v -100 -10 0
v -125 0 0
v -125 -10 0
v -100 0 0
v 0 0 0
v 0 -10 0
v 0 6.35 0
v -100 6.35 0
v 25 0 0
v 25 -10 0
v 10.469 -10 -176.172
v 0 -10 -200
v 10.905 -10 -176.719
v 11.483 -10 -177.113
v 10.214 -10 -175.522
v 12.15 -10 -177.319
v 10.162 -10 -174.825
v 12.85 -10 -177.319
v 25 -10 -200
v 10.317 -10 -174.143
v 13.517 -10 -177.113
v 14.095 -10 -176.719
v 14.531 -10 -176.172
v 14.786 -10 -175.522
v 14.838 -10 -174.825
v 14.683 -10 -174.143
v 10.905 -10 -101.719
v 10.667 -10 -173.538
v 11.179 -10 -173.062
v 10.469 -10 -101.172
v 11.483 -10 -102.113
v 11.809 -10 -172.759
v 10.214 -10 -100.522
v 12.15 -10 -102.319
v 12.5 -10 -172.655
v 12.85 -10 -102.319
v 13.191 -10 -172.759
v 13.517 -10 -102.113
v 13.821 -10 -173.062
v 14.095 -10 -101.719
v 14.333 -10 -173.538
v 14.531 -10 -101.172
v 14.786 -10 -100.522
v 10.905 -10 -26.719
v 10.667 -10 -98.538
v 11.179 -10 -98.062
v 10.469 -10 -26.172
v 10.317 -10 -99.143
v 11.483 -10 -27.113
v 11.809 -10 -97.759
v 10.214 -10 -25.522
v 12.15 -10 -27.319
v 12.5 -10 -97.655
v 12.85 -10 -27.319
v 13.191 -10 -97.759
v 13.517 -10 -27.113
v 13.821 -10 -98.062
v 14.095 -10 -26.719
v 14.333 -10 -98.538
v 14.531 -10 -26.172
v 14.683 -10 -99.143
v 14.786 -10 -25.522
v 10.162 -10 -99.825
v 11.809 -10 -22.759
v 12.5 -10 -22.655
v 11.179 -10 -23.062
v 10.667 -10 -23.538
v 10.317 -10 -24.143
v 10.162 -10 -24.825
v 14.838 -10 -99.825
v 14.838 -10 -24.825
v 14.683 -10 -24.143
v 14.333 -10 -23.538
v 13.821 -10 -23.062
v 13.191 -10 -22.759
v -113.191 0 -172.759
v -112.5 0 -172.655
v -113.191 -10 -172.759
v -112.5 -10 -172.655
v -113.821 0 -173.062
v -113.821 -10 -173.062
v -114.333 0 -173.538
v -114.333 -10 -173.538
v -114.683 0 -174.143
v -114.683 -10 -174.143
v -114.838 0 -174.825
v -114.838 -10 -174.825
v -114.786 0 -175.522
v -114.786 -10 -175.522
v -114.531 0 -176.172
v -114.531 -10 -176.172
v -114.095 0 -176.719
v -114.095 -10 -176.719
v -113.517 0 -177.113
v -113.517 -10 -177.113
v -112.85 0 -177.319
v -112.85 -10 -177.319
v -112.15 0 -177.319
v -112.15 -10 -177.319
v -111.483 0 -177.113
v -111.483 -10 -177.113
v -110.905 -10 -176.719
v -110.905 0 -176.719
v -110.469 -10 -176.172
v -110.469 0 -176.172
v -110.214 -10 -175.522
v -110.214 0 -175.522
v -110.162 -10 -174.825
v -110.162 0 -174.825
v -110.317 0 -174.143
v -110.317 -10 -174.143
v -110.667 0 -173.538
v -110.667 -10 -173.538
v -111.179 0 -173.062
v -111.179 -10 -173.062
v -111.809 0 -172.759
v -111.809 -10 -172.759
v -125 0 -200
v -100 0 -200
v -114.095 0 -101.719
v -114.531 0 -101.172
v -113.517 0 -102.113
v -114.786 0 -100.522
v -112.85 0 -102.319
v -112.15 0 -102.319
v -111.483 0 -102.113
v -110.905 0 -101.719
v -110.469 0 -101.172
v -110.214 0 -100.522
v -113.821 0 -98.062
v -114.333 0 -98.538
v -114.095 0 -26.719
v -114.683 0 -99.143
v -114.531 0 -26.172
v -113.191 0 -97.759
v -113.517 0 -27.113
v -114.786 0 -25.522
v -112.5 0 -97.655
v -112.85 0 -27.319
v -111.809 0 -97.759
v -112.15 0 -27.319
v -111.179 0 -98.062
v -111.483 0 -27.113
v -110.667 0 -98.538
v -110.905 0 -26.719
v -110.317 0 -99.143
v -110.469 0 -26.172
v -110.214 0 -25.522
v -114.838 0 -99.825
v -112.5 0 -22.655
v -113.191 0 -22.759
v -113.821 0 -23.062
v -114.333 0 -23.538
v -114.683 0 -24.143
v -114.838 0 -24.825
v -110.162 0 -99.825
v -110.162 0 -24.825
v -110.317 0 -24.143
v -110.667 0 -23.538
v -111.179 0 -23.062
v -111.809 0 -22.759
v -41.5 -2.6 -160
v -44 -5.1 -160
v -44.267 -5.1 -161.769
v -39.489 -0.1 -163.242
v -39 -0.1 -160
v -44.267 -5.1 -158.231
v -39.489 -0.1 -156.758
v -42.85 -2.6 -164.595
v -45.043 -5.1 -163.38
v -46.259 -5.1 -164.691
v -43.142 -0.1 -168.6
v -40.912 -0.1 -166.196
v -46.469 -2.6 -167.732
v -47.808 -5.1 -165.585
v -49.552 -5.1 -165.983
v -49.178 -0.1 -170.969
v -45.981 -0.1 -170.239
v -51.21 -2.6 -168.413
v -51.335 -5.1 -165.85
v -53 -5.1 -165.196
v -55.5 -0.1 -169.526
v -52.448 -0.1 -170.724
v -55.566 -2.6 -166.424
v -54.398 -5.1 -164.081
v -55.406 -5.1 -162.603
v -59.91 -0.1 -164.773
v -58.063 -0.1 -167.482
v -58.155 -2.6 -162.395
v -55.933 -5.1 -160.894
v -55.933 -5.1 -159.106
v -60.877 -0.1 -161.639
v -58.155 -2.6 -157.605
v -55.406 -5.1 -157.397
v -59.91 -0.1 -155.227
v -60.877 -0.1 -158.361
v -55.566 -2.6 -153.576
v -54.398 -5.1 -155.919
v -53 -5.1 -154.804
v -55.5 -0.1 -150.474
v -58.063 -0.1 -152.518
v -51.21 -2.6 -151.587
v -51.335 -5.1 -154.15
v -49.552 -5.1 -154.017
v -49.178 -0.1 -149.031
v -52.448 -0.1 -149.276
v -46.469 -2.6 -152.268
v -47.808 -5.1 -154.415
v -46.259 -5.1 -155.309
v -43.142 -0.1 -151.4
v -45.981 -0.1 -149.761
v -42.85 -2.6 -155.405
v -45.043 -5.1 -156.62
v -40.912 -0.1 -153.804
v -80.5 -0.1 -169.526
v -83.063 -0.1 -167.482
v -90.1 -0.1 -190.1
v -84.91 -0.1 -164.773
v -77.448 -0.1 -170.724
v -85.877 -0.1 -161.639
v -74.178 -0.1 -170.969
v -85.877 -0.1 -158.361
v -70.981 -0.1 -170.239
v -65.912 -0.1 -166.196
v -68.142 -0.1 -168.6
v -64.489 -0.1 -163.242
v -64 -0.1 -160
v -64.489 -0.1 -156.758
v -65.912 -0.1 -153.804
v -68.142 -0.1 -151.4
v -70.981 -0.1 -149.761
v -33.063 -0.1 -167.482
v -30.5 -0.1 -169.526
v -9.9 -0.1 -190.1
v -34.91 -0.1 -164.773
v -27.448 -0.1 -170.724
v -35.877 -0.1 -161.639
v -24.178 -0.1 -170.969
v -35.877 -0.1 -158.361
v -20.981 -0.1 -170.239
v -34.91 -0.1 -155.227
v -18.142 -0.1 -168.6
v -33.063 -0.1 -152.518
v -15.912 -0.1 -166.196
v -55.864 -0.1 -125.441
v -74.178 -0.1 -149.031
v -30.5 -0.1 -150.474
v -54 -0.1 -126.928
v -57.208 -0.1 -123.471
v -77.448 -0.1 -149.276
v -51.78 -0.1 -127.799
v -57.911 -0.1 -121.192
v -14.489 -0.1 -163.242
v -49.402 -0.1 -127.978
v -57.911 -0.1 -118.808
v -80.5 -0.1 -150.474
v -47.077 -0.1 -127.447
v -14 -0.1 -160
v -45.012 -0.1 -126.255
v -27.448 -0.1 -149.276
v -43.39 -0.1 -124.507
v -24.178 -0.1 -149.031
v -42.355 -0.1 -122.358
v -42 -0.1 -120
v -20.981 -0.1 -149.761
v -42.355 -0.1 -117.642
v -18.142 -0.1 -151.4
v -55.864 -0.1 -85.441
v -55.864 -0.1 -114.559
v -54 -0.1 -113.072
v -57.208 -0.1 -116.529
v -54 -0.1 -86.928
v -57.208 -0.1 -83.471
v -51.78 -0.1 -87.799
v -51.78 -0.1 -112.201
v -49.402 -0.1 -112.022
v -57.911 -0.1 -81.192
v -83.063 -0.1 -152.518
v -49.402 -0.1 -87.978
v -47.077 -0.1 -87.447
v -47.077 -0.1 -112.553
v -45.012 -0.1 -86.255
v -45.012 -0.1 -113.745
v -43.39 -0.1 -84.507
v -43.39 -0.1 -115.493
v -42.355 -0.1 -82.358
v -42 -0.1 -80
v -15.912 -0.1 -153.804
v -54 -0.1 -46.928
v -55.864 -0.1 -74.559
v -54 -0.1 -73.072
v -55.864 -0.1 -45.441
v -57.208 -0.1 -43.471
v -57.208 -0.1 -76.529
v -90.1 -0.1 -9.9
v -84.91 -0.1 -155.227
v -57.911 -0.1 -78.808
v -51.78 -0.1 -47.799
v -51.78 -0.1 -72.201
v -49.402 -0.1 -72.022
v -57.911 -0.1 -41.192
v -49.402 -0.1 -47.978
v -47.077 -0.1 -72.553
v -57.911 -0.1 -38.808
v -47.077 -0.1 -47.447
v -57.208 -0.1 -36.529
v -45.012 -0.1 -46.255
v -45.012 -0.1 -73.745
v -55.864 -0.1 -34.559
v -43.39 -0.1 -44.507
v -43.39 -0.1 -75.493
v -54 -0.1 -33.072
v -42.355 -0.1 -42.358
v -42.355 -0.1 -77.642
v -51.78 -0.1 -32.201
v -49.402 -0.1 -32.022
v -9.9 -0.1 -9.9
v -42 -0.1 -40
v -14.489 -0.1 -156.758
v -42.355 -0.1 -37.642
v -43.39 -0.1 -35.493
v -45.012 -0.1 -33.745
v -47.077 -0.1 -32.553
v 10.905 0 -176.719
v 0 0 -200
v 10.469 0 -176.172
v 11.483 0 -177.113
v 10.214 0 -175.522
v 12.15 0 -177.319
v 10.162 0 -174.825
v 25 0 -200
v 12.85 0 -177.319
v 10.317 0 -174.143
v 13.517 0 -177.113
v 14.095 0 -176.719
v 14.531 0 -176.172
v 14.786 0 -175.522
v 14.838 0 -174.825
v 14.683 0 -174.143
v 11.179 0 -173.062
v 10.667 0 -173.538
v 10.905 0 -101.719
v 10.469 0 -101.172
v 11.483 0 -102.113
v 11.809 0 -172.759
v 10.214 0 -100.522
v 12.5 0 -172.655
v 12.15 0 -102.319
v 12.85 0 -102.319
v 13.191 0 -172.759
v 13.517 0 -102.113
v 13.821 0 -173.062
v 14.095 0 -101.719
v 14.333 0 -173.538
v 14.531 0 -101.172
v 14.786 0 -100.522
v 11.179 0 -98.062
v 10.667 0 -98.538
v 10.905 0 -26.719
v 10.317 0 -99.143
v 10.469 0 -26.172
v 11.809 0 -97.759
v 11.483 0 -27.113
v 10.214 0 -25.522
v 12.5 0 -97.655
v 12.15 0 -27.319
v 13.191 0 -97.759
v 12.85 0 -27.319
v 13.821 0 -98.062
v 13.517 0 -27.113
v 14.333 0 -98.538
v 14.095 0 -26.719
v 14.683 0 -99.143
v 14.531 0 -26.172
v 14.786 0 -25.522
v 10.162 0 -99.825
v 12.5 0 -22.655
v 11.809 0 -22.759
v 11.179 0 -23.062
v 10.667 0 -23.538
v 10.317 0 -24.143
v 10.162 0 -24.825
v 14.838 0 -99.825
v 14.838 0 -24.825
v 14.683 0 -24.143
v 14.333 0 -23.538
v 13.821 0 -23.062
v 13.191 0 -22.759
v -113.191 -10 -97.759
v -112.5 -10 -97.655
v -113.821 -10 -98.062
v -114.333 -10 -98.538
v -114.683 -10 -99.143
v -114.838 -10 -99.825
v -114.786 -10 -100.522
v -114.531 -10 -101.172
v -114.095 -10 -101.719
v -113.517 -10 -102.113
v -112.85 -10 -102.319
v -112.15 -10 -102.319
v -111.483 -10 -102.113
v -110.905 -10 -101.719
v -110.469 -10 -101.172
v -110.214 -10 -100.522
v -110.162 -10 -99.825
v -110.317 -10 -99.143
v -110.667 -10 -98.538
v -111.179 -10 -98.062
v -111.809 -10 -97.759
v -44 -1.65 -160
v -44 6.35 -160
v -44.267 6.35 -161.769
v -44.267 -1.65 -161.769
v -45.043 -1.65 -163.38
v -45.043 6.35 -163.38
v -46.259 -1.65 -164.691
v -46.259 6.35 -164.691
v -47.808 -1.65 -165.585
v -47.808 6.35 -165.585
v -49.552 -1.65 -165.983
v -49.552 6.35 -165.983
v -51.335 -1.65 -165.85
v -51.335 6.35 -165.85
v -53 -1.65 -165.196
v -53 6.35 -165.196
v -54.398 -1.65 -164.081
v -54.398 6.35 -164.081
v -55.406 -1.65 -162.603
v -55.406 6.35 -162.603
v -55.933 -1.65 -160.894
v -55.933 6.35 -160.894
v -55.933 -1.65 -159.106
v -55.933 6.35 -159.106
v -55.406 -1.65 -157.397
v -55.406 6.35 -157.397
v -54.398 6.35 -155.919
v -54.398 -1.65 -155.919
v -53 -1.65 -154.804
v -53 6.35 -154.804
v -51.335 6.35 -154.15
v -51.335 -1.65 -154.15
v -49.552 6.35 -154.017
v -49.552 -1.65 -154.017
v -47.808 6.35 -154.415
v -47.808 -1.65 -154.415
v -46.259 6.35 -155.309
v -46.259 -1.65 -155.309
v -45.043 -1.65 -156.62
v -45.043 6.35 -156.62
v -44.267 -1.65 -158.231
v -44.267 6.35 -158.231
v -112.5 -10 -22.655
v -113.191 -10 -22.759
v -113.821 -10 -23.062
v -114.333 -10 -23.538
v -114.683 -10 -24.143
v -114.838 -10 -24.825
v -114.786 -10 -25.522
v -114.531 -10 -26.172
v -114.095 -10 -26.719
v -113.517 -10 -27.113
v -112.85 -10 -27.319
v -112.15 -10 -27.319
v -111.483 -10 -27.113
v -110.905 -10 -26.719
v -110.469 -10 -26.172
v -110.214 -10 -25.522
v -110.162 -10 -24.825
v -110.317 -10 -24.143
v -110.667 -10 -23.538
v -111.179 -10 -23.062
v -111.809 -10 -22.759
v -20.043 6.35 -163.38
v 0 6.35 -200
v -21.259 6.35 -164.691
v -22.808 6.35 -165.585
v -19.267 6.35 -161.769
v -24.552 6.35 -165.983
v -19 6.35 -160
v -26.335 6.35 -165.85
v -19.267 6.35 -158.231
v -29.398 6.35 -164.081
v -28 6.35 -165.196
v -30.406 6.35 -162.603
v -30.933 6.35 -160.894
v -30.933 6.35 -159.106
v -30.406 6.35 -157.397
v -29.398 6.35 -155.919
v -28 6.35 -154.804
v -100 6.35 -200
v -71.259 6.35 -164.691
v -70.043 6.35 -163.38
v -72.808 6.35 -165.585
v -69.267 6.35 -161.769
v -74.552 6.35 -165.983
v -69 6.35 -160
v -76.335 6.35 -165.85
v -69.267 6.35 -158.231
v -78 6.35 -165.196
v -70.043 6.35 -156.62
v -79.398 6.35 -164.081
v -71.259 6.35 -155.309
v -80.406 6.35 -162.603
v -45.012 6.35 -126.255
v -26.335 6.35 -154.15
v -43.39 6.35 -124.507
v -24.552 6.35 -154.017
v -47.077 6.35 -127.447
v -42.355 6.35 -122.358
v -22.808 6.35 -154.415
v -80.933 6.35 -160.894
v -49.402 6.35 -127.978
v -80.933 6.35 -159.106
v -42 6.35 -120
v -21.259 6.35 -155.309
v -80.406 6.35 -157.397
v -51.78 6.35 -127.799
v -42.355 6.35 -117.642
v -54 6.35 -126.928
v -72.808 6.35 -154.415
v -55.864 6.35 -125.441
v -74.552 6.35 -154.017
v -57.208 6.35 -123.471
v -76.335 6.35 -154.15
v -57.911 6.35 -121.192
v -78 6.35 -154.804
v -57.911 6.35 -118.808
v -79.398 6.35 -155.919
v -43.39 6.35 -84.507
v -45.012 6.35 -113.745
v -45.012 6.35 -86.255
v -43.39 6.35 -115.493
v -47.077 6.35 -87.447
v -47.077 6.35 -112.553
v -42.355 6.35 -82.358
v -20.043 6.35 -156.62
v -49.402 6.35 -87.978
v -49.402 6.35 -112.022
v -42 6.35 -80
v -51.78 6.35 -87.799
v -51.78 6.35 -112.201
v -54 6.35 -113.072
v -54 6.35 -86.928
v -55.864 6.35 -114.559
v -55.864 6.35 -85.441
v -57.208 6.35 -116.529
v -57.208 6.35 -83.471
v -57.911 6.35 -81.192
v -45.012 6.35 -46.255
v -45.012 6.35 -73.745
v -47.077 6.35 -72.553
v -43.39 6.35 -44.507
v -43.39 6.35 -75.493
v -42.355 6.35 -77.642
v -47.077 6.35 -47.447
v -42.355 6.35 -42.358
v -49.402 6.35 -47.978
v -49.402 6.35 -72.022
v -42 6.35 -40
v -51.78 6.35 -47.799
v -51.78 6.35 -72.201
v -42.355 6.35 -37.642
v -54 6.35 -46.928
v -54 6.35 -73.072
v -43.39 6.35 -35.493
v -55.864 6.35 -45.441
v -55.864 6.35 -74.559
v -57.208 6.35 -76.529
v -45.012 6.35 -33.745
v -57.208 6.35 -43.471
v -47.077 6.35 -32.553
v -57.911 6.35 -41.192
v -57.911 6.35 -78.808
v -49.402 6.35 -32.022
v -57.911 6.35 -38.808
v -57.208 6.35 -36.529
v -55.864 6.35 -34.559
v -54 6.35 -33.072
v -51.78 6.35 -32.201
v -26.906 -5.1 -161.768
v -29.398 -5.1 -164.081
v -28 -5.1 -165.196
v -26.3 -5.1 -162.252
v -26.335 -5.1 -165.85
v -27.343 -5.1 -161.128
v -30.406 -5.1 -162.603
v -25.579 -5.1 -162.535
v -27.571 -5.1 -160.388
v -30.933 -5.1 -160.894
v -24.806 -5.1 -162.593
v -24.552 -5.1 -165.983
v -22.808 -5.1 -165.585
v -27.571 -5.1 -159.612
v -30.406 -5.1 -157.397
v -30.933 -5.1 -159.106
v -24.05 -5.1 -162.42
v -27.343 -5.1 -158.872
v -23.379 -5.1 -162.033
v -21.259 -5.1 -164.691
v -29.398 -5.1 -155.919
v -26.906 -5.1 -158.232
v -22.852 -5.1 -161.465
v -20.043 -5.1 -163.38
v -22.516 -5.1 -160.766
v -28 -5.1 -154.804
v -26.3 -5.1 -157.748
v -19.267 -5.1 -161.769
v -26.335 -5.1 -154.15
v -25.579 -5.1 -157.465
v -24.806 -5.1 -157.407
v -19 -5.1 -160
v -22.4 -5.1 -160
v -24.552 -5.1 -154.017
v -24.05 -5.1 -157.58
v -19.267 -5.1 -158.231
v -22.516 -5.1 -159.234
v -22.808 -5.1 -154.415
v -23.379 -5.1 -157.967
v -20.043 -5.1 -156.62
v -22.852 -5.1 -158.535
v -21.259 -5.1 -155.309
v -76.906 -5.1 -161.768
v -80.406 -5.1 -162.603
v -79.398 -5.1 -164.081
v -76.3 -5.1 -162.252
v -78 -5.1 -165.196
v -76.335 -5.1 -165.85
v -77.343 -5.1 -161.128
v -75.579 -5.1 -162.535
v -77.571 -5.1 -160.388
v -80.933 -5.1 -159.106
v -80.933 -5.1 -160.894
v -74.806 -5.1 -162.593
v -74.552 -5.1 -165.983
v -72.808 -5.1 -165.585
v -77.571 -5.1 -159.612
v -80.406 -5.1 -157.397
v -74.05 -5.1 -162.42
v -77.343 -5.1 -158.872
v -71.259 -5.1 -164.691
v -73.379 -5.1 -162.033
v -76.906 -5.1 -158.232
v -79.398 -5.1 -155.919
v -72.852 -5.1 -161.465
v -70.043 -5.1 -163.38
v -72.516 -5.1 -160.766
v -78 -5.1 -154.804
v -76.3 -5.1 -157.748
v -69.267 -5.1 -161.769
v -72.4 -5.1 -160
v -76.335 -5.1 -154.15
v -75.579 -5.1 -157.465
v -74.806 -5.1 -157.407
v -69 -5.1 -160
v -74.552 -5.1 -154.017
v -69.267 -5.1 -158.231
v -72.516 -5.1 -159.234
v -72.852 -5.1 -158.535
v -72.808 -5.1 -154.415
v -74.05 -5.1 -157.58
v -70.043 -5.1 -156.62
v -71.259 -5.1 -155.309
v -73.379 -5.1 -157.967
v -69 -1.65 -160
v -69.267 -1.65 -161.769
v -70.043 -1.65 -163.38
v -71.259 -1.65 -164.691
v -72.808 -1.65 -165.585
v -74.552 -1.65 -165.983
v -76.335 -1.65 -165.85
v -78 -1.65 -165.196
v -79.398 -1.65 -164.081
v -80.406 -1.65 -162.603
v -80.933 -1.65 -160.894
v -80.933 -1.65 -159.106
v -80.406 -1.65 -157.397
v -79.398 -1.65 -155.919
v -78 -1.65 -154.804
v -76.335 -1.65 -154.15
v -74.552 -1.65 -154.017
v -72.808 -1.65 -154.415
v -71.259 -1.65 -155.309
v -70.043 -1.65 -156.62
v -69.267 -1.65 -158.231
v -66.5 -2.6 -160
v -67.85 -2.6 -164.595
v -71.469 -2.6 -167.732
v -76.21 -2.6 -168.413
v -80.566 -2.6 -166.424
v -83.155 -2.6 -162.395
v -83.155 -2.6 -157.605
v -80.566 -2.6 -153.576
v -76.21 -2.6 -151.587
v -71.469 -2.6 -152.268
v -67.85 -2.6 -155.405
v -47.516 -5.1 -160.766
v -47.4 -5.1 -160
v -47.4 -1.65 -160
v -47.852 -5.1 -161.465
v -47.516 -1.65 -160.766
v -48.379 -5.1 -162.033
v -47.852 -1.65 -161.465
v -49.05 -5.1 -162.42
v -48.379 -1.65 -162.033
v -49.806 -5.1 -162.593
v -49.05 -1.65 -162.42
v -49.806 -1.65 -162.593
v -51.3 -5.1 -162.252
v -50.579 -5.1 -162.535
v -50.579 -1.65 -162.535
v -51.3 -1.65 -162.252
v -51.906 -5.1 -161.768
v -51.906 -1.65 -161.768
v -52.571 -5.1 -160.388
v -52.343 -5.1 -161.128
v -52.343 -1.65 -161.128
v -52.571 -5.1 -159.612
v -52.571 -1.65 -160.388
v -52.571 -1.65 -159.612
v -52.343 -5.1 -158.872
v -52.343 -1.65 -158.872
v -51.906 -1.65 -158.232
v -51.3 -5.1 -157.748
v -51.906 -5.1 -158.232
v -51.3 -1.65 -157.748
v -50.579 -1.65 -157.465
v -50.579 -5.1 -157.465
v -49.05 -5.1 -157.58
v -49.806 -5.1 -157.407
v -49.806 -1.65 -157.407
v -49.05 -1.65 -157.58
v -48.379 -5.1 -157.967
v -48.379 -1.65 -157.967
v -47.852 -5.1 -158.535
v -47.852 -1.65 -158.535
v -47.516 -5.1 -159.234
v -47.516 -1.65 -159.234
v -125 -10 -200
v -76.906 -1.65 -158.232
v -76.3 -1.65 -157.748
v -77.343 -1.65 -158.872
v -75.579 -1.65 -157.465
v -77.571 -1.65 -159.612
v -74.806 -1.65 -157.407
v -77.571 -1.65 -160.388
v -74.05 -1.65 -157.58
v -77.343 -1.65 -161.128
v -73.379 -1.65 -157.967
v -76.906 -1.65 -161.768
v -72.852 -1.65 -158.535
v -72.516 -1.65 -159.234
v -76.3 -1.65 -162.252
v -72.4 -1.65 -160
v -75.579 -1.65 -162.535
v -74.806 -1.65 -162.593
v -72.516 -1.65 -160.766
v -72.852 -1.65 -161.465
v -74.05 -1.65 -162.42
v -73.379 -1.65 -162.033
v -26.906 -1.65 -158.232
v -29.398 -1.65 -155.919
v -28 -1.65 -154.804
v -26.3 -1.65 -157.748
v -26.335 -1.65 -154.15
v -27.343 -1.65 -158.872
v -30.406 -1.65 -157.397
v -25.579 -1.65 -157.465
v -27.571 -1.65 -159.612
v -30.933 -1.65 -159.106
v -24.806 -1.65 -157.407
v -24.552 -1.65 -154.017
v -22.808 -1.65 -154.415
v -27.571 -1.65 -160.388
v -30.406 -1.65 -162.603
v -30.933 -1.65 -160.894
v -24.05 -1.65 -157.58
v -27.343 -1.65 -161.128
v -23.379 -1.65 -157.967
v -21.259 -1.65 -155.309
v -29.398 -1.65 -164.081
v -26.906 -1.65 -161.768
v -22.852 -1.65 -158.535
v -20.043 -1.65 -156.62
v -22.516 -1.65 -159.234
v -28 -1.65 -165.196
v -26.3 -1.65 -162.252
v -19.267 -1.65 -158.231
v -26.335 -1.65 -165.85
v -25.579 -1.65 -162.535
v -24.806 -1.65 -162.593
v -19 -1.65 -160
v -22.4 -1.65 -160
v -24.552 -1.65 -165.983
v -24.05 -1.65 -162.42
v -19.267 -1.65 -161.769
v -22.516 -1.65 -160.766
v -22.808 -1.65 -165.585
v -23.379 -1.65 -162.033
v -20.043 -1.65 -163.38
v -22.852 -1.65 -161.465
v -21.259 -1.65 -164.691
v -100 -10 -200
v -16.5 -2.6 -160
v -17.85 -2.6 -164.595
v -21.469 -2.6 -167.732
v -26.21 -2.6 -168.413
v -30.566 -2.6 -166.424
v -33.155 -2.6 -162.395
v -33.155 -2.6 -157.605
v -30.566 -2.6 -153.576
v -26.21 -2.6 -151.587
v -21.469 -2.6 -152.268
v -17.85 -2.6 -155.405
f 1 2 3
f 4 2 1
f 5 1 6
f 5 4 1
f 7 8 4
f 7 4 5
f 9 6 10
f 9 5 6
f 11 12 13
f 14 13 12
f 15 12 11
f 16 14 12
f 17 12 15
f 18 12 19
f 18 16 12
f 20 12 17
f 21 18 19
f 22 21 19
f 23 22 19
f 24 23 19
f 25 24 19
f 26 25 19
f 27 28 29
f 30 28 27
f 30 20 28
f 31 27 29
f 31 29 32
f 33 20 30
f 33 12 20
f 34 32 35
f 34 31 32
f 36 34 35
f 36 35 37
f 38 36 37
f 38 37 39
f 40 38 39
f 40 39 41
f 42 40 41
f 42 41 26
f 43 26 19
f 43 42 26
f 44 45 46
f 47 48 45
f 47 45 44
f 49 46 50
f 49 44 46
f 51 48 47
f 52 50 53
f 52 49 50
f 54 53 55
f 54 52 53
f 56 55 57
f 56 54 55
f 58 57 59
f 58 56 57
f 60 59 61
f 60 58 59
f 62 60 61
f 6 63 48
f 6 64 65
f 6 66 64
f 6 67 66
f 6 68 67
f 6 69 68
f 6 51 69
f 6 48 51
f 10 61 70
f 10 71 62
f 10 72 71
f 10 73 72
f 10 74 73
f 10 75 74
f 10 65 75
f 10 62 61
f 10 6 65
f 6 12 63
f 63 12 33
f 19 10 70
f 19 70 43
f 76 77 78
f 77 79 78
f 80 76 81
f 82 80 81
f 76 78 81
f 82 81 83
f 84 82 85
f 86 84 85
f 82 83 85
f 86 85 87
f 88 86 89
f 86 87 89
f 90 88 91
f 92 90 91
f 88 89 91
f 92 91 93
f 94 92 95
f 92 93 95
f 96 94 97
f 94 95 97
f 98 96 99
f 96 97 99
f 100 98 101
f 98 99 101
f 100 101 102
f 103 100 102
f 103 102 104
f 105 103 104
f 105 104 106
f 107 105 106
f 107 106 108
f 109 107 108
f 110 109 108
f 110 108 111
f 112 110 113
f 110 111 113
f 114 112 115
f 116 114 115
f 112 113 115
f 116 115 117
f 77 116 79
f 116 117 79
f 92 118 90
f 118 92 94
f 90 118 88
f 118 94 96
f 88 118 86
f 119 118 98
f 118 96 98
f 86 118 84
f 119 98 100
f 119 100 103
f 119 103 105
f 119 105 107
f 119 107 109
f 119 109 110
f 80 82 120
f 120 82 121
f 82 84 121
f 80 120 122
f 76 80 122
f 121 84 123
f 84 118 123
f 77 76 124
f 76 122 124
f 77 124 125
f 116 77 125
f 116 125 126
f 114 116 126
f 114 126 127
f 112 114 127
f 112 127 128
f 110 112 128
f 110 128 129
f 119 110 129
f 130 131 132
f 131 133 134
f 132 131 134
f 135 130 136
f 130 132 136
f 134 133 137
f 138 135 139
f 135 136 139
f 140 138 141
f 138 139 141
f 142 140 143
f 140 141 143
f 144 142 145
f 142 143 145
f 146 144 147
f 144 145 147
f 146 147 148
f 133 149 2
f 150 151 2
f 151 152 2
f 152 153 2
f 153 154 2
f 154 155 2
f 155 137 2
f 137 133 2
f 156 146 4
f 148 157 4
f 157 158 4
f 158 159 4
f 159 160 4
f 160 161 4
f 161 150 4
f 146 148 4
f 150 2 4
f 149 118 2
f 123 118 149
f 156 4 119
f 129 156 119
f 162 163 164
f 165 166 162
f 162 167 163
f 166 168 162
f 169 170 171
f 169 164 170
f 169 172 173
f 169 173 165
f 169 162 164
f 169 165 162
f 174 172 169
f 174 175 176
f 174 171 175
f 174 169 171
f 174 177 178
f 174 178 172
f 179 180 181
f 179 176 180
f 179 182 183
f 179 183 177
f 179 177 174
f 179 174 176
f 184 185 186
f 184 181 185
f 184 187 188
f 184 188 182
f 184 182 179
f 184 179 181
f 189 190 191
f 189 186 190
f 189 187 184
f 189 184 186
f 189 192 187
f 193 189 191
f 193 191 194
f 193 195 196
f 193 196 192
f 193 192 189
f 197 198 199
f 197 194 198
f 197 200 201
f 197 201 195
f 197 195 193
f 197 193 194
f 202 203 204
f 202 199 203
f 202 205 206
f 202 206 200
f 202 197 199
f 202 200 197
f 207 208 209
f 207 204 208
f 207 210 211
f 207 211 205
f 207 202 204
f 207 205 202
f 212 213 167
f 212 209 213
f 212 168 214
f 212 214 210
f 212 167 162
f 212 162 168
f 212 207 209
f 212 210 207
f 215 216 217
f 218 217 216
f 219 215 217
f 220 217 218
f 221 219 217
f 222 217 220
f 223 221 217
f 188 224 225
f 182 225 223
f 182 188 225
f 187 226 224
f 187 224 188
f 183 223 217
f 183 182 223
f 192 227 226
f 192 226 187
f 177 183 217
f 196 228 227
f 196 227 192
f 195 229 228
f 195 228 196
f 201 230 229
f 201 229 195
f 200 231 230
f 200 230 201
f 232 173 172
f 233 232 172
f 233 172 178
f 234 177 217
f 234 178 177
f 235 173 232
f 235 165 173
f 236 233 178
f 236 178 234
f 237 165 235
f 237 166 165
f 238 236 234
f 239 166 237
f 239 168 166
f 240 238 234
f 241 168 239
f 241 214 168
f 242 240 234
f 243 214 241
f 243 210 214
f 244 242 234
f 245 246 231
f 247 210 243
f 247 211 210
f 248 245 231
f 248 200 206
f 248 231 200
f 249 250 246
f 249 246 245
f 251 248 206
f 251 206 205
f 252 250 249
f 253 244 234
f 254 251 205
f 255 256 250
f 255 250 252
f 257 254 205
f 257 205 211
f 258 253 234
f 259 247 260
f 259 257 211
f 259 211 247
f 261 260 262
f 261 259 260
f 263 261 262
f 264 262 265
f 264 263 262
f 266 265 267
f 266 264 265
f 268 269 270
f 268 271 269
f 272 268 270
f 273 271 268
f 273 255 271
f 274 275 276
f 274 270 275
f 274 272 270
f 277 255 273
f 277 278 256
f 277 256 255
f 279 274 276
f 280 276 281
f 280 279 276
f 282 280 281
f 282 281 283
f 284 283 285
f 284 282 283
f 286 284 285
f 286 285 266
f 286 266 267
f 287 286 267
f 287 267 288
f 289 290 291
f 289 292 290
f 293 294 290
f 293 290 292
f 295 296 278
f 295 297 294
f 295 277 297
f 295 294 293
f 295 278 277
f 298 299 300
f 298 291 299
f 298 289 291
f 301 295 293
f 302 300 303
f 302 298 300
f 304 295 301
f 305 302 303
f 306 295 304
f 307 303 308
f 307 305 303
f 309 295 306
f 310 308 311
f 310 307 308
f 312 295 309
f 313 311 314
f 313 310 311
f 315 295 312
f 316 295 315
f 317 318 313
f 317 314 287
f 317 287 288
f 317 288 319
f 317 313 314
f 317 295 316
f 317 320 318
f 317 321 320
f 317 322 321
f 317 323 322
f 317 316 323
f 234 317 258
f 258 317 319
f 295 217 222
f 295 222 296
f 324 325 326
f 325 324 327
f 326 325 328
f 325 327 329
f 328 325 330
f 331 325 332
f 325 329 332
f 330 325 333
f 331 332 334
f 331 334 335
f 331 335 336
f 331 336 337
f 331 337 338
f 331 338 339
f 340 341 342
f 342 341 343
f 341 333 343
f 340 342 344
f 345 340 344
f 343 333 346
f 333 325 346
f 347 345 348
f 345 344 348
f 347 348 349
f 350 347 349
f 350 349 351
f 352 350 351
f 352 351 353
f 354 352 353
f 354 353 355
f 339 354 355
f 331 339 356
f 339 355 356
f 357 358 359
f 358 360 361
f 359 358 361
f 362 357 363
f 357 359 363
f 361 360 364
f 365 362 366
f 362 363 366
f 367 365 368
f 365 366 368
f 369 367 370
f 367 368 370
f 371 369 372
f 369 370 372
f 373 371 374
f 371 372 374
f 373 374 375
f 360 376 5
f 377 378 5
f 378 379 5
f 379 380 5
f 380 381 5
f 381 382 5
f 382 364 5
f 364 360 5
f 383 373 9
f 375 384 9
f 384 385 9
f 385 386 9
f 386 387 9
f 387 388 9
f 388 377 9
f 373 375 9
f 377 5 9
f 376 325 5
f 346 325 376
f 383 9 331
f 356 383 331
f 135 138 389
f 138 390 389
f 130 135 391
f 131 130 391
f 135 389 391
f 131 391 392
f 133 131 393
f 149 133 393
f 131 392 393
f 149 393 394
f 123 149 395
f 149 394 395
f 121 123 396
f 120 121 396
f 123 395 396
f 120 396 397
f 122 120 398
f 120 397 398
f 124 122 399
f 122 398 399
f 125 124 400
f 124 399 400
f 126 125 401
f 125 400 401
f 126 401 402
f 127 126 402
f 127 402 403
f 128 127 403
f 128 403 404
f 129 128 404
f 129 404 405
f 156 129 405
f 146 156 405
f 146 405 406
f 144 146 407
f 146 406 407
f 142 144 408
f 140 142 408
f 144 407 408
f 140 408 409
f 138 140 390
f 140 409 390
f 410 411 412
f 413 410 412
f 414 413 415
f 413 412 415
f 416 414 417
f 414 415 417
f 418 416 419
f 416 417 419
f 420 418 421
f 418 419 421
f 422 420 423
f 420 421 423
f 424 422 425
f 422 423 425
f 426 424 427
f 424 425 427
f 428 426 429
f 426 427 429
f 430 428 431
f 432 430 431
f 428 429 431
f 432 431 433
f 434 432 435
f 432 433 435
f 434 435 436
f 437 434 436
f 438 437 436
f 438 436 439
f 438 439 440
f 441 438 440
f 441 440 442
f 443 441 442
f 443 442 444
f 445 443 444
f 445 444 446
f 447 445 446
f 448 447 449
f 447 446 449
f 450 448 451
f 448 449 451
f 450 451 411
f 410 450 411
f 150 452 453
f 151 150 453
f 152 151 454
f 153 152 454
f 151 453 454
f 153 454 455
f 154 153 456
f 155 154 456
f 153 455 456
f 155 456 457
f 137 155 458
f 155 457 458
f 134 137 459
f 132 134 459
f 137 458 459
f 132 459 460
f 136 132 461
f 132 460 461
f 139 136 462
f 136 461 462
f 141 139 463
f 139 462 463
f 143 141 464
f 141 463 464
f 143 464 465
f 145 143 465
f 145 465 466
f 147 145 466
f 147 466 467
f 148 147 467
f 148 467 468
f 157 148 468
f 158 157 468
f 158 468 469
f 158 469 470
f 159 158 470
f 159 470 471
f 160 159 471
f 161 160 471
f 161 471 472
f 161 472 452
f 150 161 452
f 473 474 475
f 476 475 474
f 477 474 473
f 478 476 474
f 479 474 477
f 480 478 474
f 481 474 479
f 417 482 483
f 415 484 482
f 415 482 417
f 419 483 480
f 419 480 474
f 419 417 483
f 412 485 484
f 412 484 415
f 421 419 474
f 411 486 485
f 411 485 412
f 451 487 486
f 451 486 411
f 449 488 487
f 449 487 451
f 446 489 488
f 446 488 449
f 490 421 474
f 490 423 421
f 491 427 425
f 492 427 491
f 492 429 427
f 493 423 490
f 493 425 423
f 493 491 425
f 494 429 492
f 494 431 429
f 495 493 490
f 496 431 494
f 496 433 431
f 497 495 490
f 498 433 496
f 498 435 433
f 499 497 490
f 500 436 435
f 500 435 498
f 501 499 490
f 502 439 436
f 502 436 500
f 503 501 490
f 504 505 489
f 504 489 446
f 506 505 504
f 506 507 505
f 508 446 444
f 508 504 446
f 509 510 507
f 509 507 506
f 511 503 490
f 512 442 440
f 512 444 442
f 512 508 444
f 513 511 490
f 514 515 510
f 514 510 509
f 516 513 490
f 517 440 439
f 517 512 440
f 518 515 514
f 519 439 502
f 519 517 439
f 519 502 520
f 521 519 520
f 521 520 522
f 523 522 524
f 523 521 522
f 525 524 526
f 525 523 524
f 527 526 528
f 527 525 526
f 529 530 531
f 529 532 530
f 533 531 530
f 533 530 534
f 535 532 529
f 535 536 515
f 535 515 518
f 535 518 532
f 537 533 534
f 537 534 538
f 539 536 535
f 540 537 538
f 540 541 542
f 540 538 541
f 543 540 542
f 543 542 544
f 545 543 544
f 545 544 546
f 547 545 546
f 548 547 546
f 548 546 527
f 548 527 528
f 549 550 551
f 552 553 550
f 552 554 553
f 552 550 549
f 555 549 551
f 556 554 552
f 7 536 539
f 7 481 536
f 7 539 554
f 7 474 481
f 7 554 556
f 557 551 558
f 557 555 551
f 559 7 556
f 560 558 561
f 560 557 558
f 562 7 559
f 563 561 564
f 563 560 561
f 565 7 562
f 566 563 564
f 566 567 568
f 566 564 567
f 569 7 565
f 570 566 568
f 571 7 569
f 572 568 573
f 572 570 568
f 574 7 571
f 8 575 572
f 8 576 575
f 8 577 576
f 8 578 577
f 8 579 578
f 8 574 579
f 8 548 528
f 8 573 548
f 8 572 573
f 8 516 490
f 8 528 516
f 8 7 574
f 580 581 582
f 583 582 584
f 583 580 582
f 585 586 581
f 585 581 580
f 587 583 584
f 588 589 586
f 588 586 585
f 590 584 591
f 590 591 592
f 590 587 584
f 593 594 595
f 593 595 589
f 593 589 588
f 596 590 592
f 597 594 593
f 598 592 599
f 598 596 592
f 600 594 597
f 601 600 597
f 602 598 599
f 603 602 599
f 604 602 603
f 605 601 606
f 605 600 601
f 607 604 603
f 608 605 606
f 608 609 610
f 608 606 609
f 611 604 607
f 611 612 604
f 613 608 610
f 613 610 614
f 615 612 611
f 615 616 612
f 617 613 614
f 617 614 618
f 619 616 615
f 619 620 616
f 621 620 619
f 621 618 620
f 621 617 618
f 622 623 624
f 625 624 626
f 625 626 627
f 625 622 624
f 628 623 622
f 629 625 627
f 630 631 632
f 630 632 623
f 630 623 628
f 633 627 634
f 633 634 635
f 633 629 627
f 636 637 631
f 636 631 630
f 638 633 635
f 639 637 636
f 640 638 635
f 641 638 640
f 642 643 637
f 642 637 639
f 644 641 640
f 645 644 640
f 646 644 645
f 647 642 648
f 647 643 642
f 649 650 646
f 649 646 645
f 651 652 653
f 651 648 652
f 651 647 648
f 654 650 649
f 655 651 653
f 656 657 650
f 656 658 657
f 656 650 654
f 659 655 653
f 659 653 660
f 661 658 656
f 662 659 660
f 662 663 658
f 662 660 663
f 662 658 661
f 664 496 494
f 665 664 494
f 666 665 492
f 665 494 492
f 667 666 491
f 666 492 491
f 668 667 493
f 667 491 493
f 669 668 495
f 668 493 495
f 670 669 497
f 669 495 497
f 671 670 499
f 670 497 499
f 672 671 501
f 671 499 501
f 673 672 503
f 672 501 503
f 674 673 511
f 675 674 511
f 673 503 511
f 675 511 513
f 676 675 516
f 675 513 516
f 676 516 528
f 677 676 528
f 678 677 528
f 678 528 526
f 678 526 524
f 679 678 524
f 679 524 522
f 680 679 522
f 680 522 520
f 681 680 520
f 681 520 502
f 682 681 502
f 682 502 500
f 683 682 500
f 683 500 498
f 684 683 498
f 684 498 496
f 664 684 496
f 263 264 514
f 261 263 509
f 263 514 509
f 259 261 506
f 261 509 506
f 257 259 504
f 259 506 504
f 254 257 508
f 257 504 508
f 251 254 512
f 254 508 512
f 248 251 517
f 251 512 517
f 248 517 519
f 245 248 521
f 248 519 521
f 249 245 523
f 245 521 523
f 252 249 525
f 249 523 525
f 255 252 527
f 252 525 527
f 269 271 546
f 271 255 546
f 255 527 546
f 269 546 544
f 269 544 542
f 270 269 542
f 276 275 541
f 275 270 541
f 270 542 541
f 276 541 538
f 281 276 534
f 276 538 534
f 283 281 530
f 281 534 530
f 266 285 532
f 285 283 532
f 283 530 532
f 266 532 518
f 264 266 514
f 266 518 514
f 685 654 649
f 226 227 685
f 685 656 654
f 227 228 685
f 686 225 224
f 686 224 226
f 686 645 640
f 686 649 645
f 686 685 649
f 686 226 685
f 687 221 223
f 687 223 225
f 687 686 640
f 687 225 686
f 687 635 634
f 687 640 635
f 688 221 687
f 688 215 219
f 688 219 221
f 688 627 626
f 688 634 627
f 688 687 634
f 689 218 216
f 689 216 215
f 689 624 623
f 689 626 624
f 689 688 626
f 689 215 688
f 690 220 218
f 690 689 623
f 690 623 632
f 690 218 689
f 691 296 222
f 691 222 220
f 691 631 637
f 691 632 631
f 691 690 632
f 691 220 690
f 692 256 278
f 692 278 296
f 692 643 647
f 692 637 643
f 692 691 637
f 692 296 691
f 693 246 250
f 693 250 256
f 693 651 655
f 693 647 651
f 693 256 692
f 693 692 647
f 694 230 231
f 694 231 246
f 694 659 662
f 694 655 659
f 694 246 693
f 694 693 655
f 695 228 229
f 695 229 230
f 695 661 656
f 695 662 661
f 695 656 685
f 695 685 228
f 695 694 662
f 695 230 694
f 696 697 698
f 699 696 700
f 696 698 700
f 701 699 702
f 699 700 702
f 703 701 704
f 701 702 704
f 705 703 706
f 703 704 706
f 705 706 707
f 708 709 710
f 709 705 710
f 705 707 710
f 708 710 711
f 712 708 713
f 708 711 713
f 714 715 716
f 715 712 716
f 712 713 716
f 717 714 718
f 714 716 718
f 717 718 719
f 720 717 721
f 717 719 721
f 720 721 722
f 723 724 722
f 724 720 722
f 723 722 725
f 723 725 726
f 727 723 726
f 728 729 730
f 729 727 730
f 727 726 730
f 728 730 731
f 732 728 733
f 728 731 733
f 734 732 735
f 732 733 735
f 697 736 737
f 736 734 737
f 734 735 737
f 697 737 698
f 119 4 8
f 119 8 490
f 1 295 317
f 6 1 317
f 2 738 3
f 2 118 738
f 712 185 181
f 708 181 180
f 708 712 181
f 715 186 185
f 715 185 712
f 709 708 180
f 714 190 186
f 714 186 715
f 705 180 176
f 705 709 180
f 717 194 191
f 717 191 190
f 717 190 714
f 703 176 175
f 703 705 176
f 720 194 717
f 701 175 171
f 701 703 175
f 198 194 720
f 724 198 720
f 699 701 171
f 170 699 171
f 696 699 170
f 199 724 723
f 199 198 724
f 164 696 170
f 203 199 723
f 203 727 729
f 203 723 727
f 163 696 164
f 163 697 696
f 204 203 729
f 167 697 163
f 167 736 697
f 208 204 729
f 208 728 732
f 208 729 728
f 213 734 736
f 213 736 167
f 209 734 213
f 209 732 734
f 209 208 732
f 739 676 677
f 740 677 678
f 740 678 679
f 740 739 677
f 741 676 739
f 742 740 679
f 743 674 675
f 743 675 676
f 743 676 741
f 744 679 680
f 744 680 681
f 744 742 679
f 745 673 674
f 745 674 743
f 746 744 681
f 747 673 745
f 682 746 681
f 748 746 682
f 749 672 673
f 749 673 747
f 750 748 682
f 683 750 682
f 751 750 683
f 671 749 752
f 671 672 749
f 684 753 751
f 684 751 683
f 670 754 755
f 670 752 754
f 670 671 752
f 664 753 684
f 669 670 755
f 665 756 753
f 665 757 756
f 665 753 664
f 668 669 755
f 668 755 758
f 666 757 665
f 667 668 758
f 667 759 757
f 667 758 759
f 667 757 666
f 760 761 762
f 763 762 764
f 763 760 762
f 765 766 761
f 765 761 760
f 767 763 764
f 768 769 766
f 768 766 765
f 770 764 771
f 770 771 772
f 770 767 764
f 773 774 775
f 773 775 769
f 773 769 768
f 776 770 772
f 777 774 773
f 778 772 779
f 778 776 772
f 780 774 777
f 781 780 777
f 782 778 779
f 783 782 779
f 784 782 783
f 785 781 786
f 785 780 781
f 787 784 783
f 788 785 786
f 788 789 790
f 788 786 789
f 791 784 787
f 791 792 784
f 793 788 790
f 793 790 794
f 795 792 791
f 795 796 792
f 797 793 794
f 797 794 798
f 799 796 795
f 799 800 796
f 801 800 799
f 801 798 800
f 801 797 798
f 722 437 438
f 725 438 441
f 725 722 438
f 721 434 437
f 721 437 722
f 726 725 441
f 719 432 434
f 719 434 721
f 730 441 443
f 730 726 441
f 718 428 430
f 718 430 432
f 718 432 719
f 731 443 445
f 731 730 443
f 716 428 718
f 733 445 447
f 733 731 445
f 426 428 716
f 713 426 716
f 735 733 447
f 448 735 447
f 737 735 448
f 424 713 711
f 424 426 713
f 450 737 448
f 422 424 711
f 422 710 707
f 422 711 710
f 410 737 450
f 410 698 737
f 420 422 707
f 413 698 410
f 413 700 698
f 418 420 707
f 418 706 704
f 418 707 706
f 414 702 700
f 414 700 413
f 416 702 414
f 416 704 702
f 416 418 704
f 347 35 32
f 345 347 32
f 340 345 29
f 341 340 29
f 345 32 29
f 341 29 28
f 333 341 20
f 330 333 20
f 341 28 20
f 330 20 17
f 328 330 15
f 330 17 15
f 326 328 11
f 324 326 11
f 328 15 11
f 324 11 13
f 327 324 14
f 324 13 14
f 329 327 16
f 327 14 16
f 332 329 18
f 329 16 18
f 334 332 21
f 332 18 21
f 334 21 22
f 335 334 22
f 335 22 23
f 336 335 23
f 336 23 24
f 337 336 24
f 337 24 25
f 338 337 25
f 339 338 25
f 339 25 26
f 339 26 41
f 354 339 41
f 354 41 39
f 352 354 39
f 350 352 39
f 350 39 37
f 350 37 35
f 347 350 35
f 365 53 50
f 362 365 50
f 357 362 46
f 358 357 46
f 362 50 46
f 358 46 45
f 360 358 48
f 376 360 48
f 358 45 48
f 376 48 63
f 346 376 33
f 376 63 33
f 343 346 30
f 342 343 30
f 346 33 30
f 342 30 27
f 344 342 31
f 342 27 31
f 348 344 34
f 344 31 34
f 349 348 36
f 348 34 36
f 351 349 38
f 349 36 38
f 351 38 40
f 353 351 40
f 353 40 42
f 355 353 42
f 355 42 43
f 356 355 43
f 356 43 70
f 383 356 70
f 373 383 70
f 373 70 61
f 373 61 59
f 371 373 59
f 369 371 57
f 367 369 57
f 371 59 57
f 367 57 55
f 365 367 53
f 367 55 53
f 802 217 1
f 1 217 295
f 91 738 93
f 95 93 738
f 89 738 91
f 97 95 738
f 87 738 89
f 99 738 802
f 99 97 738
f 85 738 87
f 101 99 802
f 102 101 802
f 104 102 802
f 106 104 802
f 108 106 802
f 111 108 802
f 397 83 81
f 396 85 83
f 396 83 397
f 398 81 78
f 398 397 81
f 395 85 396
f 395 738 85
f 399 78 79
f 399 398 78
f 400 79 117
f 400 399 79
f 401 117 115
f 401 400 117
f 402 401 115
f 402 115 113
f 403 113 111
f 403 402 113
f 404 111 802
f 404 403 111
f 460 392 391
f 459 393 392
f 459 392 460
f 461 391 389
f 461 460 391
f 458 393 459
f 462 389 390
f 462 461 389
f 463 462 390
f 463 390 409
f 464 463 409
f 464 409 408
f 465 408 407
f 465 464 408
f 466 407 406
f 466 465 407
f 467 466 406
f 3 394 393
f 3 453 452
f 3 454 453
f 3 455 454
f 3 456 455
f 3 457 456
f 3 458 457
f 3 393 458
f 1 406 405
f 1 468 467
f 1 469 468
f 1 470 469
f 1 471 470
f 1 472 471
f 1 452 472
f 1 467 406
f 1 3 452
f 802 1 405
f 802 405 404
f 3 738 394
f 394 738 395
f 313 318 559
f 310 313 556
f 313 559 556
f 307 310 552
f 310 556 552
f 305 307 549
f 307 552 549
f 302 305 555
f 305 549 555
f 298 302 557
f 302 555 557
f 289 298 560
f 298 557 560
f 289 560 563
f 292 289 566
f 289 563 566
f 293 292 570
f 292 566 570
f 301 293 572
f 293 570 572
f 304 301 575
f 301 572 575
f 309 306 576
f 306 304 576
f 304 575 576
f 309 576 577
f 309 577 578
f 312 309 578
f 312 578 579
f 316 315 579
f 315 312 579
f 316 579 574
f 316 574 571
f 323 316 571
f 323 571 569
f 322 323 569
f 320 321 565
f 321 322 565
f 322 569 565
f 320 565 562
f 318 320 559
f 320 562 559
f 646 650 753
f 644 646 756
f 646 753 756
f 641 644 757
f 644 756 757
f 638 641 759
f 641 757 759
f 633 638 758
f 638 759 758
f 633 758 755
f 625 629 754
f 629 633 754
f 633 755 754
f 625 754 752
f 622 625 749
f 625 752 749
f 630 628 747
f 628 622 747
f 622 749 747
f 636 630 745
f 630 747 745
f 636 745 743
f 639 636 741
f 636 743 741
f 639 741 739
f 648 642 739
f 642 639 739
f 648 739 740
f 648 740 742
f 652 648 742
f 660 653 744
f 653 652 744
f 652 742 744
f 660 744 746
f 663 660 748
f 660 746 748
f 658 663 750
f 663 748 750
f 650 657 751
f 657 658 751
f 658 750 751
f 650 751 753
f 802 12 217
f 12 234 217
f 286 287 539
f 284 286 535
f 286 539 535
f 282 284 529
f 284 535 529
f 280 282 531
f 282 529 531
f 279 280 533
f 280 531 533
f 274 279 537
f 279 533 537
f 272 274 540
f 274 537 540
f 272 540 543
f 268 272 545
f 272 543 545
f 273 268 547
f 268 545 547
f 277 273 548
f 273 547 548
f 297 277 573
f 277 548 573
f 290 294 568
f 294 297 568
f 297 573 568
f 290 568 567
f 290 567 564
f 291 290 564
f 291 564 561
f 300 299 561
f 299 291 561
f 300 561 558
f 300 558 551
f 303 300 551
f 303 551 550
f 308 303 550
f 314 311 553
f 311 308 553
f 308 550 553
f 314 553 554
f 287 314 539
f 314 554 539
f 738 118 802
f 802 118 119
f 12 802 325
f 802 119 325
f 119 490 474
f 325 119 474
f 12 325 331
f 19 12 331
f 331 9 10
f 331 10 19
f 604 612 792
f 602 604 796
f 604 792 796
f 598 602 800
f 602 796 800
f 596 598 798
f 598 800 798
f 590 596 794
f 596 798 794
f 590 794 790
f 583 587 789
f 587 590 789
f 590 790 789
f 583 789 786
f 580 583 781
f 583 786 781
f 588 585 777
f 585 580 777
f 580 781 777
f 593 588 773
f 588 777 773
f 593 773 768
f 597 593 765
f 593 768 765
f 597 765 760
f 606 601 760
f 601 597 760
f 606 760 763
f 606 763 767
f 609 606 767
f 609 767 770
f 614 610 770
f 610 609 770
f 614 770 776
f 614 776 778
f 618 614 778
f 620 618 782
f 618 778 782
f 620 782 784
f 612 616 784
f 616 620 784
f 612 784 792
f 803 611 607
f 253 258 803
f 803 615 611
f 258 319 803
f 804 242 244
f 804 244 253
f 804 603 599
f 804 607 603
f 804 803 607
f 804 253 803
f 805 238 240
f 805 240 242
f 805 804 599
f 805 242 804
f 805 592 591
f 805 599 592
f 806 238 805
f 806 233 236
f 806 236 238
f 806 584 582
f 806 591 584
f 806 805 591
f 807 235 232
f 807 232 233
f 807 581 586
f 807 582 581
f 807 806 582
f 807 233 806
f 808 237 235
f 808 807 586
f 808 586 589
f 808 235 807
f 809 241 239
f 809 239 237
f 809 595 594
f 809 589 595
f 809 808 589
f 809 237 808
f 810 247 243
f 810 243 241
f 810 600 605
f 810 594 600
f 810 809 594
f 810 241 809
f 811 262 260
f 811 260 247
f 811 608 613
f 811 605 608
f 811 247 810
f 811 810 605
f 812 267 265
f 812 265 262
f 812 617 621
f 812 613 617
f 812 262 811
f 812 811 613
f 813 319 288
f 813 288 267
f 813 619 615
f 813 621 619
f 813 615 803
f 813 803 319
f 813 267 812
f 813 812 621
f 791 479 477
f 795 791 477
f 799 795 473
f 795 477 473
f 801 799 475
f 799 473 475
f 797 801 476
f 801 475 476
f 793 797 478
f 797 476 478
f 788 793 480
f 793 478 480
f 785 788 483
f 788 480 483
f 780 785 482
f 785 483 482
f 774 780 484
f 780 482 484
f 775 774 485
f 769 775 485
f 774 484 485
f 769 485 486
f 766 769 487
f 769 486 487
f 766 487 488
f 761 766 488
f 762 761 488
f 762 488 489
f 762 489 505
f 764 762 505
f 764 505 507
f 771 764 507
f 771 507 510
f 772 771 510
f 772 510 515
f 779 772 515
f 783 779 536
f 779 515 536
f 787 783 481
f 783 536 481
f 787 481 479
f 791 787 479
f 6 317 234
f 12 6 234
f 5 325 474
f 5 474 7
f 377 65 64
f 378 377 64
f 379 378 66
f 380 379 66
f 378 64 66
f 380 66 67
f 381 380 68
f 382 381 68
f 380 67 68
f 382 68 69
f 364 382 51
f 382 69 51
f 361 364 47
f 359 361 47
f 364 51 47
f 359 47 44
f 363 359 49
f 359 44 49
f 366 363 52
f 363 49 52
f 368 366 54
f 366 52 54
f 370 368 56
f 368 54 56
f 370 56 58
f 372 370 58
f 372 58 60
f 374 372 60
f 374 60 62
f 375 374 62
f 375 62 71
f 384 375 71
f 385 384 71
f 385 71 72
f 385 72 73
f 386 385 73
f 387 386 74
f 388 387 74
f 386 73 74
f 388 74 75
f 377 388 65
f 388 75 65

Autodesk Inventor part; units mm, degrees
ref_plane "YZ Plane" through (0, 0, 0) normal (1, 0, 0) x (0, 1, 0)
ref_plane "XZ Plane" through (0, 0, 0) normal (0, 1, 0) x (-1, 0, 0)
ref_plane "XY Plane" through (0, 0, 0) normal (0, 0, 1) x (1, 0, 0)
sketch "Sketch1" plane through (0, 0, 0) normal (0, 1, 0) x (-1, 0, 0)
  line L0 (0, 0) -> (100, 0)
  line L1 (100, 0) -> (100, -200)
  line L2 (100, -200) -> (0, -200)
  line L3 (0, -200) -> (0, 0)
  dimension "d0" = 200
  dimension "d1" = 100
extrude "Extrusion1" add sketch "Sketch1" along normal blind 6.35
sketch "Sketch2" plane through (0, 0, 0) normal (0, -1, 0) x (1, 0, 0)
  line L0 (0, 0) -> (0, -200) projected
  line L1 (0, -200) -> (-100, -200) projected
  line L2 (-100, -200) -> (-100, 0) projected
  line L3 (-100, 0) -> (0, 0) projected
  line L4 (25, 25) -> (25, -225)
  line L5 (25, -225) -> (-125, -225)
  line L6 (-125, -225) -> (-125, 25)
  line L7 (-125, 25) -> (25, 25)
  dimension "d4" = 25
extrude "Extrusion2" add sketch "Sketch2" along normal blind 10 contours L0 L1 L2 L3 | L4 L5 L6 L7
sketch "Sketch4" plane through (0, 6.35, 0) normal (0, 1, 0) x (1, 0, 0)
  line L0 (-100, 0) -> (0, 0) construction
  line L1 (-75, 0) -> (-75, 200) construction
  line L2 (0, 200) -> (-100, 200) construction
  line L3 (0, 0) -> (0, 200) construction
  line L4 (-100, 200) -> (-100, 0) construction
  line L5 (-50, 0) -> (-50, 200) construction
  line L6 (-100, 40) -> (0, 40) construction
  line L7 (-100, 120) -> (0, 120) construction
  line L8 (-100, 80) -> (0, 80) construction
  line L9 (-25, 0) -> (-25, 200) construction
  line L10 (-100, 160) -> (0, 160) construction
  circle A0 centre (-50, 120) radius 8
  circle A1 centre (-50, 80) radius 8
  circle A2 centre (-50, 40) radius 8
  circle A3 centre (-75, 160) radius 2.6
  circle A4 centre (-50, 160) radius 2.6
  circle A5 centre (-25, 160) radius 2.6
  dimension "d15" = 100
  dimension "d16" = 25
  dimension "d17" = 200
  dimension "d18" = 25
  dimension "d19" = 40
  dimension "d20" = 40
  dimension "d21" = 40
  dimension "d22" = 25
  dimension "d23" = 40
  dimension "d24" = 16
  dimension "d25" = 16
  dimension "d26" = 16
  dimension "d27" = 5.2
  dimension "d28" = 5.2
  dimension "d29" = 5.2
  dimension "d30" = 0
  dimension "d31" = 50
extrude "Extrusion3" cut sketch "Sketch4" against normal through all
sketch "Sketch5" plane through (0, -10, 0) normal (0, -1, 0) x (1, 0, 0)
  circle A0 centre (-50, -40) radius 8 projected
  circle A1 centre (-25, -160) radius 2.6 projected
  circle A2 centre (-50, -80) radius 8 projected
  circle A3 centre (-75, -160) radius 2.6 projected
  circle A4 centre (-50, -160) radius 2.6 projected
  circle A5 centre (-50, -120) radius 8 projected
  line L0 (0, -200) -> (-100, -200) projected
  line L1 (-100, -200) -> (-100, 0) projected
  line L2 (-100, 0) -> (0, 0) projected
  line L3 (0, 0) -> (0, -200) projected
extrude "Extrusion4" cut sketch "Sketch5" against normal blind 9.9
chamfer "Chamfer1" distance 9.9 angle 45 4 edges at (0, -0.1, -100) (-50, -0.1, 0) (-100, -0.1, -100) (-50, -0.1, -200)
sketch "Sketch9" plane through (0, -0.1, 0) normal (0, -1, 0) x (1, 0, 0)
  line L0 (-9.9, -9.9) -> (-90.1, -9.9) projected
  line L1 (-90.1, -9.9) -> (-90.1, -190.1) projected
  line L2 (-90.1, -190.1) -> (-9.9, -190.1) projected
  line L3 (-9.9, -190.1) -> (-9.9, -9.9) projected
  circle A0 centre (-50, -40) radius 8 projected
  circle A1 centre (-25, -160) radius 2.6 projected
  circle A2 centre (-50, -80) radius 8 projected
  circle A3 centre (-75, -160) radius 2.6 projected
  circle A4 centre (-50, -160) radius 2.6 projected
  circle A5 centre (-50, -120) radius 8 projected
  line L4 (-125, 25) -> (25, 25) projected
  line L5 (25, 25) -> (25, -225) projected
  line L6 (25, -225) -> (-125, -225) projected
  line L7 (-125, -225) -> (-125, 25) projected
  circle A6 centre (-25, -160) radius 6
  circle A7 centre (-50, -160) radius 6
  circle A8 centre (-75, -160) radius 6
  point P0 (0, 0)
  dimension "d44" = 12
  dimension "d45" = 12
  dimension "d46" = 12
extrude "Extrusion6" add sketch "Sketch9" along normal blind 5 contours A6 | A7 | A8
chamfer "Chamfer2" distance 5 angle 45 3 edges at (-31, -0.1, -160) (-56, -0.1, -160) (-81, -0.1, -160)
sketch "Sketch10" plane through (0, 6.35, 0) normal (0, 1, 0) x (1, 0, 0)
  circle A0 centre (-50, 160) radius 6 projected
  circle A1 centre (-50, 160) radius 2.6 projected
  circle A2 centre (-75, 160) radius 6 projected
  circle A3 centre (-75, 160) radius 2.6 projected
  circle A4 centre (-25, 160) radius 6 projected
  circle A5 centre (-25, 160) radius 2.6 projected
  point P0 (0, 0)
extrude "Extrusion7" cut sketch "Sketch10" against normal blind 8
sketch "Sketch11" plane through (0, 0, 0) normal (0, 1, 0) x (1, 0, 0)
  circle A0 centre (-25, 160) radius 6 projected
  circle A1 centre (-50, 160) radius 6 projected
  circle A2 centre (-75, 160) radius 6 projected
  circle A3 centre (-50, 40) radius 8 projected
  circle A4 centre (-50, 80) radius 8 projected
  circle A5 centre (-50, 120) radius 8 projected
  line L0 (-125, -25) -> (-125, 225) projected
  line L1 (-125, 225) -> (25, 225) projected
  line L2 (25, 225) -> (25, -25) projected
  line L3 (25, -25) -> (-125, -25) projected
  line L4 (0, 0) -> (0, 200) projected
  line L5 (0, 200) -> (-100, 200) projected
  line L6 (-100, 200) -> (-100, 0) projected
  line L7 (-100, 0) -> (0, 0) projected
  line L8 (-125, 200) -> (25, 200)
  line L9 (-125, 0) -> (25, 0)
extrude "Extrusion8" cut sketch "Sketch11" against normal through all contours L0 L9 L7 L2 L3 | L0 L1 L2 L8 L5
sketch "Sketch12" plane through (0, 0, 0) normal (0, 1, 0) x (1, 0, 0)
  line L0 (-125, 0) -> (-100, 0) projected
  line L1 (-100, 200) -> (-100, 0) projected
  line L2 (-100, 200) -> (-125, 200) projected
  line L3 (-125, 0) -> (-125, 200) projected
  line L4 (0, 0) -> (25, 0) projected
  line L5 (25, 200) -> (25, 0) projected
  line L6 (25, 200) -> (0, 200) projected
  line L7 (0, 0) -> (0, 200) projected
  line L8 (-112.5, 200) -> (-112.5, 0)
  line L9 (25, 200) -> (0, 200) projected
  line L10 (12.5, 200) -> (12.5, 0)
  line L11 (-112.5, 175) -> (12.5, 175)
  line L12 (12.5, 175) -> (12.5, 25)
  line L13 (12.5, 25) -> (-112.5, 25)
  line L14 (-112.5, 25) -> (-112.5, 175)
  point P0 (-112.5, 100)
  point P1 (12.5, 100)
  dimension "d56" = 25
  dimension "d57" = 25
hole "Hole2" at (-112.5, 0, -100) at (12.5, 0, -100) at (-112.5, 0, -175) at (12.5, 0, -175) at (12.5, 0, -25) at (-112.5, 0, -25) direction (0, -1, 0) diameter 4.69 end through all
equation "\"d16\" = 0.25 * d15"
equation "\"d18\" = d16"
equation "\"d19\" = 0.2 * d17"
equation "\"d20\" = d19"
equation "\"d21\" = d20"
equation "\"d22\" = d18"
equation "\"d23\" = d21"
equation "\"d28\" = d27"
equation "\"d29\" = d27"
equation "\"d57\" = d56"
properties part number "Faceplate"
